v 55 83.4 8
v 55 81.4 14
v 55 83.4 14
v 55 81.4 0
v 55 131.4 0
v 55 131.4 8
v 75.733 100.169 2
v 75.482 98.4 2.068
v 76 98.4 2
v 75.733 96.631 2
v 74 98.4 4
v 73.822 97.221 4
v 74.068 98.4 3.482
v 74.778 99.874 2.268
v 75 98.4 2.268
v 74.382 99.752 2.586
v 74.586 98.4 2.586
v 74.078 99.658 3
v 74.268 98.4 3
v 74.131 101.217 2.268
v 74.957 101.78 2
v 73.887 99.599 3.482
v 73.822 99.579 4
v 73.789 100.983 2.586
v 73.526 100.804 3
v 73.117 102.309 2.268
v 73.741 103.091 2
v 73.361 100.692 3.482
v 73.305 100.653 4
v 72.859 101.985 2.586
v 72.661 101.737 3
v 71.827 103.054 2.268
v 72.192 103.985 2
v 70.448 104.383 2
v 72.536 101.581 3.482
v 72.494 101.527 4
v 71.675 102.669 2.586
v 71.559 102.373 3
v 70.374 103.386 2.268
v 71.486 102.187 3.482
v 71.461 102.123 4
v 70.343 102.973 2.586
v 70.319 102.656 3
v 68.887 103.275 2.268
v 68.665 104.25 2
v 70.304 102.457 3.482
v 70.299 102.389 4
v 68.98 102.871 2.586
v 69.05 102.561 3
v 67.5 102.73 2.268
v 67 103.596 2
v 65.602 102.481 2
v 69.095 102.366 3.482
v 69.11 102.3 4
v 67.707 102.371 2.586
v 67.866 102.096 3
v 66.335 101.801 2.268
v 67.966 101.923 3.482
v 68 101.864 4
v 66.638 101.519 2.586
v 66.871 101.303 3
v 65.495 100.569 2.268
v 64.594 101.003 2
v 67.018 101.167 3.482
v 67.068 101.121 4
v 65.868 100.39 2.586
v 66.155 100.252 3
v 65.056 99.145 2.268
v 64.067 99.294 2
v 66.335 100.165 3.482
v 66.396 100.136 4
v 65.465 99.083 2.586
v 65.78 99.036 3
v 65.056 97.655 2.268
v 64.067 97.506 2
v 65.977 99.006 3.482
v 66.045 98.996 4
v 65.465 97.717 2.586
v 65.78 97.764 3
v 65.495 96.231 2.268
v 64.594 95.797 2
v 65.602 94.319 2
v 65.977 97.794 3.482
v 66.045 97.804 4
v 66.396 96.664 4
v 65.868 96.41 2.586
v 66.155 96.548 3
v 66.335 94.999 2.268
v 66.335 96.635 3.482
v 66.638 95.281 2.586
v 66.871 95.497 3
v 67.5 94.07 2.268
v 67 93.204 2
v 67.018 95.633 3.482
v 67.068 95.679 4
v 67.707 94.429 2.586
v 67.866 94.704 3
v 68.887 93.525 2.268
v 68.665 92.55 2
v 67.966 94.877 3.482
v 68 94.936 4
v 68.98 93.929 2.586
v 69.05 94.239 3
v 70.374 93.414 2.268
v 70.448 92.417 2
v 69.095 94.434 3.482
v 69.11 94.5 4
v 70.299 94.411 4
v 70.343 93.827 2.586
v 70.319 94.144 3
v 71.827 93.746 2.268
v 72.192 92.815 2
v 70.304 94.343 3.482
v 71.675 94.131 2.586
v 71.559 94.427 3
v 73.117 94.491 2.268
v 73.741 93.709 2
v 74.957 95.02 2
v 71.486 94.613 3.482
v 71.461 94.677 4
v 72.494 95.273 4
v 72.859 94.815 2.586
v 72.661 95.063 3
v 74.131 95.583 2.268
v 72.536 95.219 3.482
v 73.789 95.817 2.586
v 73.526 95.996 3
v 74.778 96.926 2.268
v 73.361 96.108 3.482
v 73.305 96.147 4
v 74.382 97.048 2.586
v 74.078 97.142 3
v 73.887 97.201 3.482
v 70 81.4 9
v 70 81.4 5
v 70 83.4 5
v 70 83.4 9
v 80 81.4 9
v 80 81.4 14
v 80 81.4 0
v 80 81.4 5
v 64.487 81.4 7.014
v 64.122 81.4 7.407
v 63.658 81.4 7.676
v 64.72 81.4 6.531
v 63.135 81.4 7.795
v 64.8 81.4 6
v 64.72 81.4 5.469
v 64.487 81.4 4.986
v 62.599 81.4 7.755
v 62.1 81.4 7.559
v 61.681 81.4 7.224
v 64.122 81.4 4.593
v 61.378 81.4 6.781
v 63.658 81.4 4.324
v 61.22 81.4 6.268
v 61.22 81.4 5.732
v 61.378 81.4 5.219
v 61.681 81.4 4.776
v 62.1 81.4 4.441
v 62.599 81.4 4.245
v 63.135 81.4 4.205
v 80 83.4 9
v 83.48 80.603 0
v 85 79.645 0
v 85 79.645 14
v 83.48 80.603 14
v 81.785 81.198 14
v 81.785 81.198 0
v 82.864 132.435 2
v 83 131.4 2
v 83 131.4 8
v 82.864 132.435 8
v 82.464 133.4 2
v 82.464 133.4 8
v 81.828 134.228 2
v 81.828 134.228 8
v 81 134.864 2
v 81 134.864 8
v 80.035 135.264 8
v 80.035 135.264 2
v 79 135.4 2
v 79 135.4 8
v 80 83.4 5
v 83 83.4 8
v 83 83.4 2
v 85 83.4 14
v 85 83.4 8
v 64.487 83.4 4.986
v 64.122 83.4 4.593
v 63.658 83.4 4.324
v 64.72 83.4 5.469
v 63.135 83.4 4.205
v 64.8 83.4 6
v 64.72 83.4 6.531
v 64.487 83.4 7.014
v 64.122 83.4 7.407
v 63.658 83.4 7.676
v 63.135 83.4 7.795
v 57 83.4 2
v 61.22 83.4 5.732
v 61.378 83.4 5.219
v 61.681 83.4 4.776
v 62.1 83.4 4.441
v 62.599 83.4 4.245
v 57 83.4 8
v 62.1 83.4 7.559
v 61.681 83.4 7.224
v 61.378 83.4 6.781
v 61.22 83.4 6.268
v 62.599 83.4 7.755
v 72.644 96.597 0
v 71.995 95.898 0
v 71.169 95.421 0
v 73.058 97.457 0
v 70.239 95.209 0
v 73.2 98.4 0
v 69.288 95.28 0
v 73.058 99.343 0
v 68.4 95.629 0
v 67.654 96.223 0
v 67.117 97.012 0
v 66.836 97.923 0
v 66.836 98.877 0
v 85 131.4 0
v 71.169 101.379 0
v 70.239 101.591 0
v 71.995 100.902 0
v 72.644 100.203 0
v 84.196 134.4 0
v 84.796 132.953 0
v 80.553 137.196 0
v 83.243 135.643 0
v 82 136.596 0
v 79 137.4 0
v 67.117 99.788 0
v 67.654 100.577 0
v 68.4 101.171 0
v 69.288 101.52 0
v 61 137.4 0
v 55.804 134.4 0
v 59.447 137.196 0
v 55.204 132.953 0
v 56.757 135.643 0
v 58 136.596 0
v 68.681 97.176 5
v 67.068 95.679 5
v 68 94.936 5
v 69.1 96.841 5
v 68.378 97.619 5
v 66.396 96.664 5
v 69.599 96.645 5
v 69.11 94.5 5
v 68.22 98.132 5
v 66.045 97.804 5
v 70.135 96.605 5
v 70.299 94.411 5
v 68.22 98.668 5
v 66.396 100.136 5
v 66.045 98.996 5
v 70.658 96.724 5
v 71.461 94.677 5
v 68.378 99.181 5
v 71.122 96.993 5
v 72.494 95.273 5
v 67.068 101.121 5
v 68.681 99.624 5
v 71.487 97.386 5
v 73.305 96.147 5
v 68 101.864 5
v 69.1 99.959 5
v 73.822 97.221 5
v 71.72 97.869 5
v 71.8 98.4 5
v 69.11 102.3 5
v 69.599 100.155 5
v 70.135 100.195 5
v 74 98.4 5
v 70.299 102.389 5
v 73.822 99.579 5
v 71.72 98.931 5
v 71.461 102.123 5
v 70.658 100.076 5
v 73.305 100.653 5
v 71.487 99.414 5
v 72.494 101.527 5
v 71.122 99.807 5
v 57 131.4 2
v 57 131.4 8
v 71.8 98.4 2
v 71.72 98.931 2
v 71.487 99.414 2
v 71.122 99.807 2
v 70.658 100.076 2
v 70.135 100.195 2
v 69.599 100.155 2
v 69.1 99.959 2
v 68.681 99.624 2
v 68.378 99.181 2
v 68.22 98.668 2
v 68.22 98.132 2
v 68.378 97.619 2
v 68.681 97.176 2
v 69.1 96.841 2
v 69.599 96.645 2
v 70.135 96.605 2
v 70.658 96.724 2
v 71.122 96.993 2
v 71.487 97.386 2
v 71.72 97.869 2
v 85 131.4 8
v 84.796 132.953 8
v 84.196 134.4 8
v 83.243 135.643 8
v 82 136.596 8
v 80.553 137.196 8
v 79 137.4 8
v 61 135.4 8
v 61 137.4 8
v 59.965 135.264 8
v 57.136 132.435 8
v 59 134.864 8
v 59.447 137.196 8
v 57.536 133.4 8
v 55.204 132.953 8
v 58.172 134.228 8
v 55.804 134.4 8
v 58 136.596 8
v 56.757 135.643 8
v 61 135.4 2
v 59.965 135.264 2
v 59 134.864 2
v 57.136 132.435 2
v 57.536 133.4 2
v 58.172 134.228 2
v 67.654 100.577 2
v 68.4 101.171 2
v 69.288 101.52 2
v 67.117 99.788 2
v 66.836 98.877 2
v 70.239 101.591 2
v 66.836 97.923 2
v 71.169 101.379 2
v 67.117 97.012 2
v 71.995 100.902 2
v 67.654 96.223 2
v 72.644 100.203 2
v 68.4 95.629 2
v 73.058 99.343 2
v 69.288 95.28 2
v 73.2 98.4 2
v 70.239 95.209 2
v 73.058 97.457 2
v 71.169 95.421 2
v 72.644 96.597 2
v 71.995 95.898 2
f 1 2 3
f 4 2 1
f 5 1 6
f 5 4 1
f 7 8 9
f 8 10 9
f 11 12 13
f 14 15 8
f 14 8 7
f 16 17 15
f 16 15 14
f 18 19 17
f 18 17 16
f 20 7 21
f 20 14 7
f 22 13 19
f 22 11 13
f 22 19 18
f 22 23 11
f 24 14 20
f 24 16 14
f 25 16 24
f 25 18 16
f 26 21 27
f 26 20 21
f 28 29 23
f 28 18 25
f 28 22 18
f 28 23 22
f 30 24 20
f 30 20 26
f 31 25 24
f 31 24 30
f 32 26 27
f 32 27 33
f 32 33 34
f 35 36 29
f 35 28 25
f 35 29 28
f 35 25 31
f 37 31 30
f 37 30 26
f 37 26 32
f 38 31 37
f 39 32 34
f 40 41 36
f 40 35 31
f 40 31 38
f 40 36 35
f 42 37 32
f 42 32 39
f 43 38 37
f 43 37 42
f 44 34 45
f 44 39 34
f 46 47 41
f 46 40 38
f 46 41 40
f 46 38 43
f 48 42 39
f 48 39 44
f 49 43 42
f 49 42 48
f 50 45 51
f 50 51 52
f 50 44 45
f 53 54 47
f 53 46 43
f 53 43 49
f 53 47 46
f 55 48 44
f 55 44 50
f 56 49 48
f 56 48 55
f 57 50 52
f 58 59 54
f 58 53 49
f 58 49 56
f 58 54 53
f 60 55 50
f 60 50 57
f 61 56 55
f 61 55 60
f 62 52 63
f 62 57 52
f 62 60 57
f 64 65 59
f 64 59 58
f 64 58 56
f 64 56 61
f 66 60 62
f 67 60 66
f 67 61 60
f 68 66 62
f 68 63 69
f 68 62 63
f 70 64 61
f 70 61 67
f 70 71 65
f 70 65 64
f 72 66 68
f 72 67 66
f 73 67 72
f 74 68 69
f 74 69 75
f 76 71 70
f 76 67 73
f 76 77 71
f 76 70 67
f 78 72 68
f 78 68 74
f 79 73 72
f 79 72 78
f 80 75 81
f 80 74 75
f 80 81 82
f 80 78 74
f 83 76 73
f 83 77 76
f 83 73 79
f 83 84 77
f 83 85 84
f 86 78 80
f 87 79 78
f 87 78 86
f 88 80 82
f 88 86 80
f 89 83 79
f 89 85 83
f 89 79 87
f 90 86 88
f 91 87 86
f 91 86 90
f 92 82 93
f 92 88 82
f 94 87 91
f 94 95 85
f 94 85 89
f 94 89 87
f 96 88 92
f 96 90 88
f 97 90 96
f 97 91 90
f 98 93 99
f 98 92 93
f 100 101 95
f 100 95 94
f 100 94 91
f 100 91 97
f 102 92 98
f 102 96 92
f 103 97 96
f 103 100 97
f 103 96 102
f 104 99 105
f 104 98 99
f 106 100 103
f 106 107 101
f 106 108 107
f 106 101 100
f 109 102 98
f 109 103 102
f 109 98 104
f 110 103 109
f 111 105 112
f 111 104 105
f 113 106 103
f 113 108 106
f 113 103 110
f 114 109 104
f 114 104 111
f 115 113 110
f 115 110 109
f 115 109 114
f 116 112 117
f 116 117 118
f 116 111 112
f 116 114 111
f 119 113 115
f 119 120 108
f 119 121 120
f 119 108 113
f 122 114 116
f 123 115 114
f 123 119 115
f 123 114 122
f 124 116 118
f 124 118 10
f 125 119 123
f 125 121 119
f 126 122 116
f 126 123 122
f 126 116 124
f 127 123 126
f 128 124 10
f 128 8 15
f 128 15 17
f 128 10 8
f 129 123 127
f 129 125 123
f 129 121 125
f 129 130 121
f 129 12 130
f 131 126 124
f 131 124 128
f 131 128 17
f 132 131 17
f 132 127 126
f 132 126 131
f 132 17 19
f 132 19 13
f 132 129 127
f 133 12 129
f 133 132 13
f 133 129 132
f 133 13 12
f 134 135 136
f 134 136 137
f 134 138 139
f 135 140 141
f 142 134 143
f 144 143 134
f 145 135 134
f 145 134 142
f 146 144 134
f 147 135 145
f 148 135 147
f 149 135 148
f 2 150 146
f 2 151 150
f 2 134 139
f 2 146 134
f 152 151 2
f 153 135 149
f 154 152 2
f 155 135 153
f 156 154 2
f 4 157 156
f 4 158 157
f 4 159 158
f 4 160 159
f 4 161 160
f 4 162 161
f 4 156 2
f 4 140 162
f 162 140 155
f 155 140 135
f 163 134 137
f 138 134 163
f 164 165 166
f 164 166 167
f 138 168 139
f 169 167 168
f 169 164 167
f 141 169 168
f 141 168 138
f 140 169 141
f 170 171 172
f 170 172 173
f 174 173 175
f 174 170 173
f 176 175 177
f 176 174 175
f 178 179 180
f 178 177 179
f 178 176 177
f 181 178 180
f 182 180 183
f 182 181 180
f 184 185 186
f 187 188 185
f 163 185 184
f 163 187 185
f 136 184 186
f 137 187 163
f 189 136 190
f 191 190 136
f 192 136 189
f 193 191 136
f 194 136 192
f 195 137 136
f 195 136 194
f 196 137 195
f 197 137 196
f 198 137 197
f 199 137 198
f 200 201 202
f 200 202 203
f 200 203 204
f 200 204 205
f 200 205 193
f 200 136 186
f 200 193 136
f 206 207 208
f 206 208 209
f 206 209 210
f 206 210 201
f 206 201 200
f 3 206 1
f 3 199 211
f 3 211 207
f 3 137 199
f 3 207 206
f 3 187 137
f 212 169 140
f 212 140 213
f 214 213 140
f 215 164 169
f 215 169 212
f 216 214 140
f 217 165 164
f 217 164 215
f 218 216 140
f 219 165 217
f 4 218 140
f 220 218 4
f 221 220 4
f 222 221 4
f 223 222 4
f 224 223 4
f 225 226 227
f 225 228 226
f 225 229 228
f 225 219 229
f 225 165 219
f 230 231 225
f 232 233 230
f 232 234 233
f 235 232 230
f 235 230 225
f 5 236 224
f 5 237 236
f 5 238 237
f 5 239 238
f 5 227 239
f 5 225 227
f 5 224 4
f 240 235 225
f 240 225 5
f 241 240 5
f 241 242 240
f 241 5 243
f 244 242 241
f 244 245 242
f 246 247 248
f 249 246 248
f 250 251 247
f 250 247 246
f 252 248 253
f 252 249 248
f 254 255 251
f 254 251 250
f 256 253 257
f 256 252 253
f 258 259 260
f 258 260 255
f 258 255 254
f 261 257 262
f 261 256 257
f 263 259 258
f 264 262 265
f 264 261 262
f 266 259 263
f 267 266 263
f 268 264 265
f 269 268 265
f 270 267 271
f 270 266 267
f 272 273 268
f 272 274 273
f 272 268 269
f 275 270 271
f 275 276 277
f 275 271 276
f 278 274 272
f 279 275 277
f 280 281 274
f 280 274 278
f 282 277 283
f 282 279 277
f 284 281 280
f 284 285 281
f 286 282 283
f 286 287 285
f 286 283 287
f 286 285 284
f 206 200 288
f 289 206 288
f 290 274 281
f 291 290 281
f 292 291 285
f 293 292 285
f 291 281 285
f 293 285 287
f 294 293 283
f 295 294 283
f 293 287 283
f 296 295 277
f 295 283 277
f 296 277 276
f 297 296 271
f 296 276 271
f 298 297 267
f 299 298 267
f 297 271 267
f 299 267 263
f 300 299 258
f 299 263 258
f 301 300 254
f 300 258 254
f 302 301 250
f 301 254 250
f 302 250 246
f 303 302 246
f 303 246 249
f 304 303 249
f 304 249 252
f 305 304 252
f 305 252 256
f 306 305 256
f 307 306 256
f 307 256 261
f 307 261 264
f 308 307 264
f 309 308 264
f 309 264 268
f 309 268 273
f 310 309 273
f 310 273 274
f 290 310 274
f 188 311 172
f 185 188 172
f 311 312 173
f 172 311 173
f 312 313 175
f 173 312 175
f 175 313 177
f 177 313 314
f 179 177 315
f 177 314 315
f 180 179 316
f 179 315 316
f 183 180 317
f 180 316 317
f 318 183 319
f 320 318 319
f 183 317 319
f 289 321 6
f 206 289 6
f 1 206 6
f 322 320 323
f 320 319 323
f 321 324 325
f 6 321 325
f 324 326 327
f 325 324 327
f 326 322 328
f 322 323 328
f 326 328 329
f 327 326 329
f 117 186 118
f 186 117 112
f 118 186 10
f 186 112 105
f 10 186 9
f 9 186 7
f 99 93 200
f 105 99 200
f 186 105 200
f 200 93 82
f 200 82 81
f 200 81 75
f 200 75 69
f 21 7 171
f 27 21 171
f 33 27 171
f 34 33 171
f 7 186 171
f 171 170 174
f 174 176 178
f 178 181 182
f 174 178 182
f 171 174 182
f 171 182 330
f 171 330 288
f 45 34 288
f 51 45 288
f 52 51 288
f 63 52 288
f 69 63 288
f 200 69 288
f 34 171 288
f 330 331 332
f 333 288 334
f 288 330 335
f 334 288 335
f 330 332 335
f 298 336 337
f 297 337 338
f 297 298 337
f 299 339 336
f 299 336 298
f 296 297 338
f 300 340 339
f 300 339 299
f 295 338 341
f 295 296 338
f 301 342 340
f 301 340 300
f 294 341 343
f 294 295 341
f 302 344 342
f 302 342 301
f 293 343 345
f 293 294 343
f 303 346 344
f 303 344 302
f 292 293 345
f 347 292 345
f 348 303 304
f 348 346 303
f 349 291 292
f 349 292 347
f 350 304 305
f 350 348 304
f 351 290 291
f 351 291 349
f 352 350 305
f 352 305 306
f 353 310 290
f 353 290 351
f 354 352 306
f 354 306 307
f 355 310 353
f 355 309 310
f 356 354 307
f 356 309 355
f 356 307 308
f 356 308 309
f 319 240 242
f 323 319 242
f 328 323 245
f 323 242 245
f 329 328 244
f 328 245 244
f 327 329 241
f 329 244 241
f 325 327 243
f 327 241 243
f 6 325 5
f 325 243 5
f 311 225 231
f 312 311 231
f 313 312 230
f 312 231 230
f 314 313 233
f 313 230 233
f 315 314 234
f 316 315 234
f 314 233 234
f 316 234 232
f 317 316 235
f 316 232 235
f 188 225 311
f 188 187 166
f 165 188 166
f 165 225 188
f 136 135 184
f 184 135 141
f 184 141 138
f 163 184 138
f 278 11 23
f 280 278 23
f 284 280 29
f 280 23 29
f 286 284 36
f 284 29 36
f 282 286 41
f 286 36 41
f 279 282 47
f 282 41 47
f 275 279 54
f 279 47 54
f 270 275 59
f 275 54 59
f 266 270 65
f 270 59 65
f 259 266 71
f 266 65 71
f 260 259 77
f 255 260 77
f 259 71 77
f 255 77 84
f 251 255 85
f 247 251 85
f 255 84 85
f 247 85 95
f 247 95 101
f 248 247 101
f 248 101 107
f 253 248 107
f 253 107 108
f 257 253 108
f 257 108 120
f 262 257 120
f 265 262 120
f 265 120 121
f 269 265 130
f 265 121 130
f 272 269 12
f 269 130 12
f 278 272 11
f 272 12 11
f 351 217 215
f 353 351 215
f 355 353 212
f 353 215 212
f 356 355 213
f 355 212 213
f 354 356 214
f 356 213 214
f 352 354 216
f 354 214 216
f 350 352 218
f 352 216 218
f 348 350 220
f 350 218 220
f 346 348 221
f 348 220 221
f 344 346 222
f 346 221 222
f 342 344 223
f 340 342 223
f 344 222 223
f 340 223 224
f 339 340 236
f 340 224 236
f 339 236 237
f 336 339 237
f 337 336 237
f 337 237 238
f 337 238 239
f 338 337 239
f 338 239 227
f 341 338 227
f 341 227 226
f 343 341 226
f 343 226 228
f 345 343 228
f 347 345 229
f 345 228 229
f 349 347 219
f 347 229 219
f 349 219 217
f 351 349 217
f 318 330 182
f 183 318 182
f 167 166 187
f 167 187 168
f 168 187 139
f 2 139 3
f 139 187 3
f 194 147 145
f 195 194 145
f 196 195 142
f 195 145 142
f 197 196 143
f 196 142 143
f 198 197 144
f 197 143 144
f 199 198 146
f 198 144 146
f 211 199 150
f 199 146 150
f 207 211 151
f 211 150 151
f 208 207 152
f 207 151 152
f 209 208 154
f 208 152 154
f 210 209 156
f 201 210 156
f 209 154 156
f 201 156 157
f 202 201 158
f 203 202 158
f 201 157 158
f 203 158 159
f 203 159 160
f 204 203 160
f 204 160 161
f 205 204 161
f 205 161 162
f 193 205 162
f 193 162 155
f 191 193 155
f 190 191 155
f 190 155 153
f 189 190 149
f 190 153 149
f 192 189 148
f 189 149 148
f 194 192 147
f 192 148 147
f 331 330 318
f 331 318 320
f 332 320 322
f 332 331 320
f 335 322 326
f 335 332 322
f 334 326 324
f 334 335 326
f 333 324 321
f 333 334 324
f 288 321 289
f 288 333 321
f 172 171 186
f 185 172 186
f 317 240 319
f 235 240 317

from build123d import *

# Parameters (mm, degrees)
PAD014_DEPTH    = 14
POCKET017_DEPTH = 12
POCKET018_DEPTH = 6
SKETCH064_R     = 4
PAD015_DEPTH    = 3
SKETCH065_R     = 1.8
POCKET019_DEPTH = 5.001
SKETCH070_R     = 1.8
SKETCH070_W     = 10
SKETCH070_H     = 4
POCKET022_DEPTH = 2
SKETCH071_R     = 3.2
POCKET023_DEPTH = 2
FILLET003_R     = 2


with BuildPart() as part:
    # Sketch059 → Pad014 (new body)
    with BuildSketch(Plane.XY):
        with BuildLine():
            Line((61, 137.4), (79, 137.4))
            ThreePointArc((85, 131.4), (83.242641, 135.642641), (79, 137.4))
            Line((85, 131.4), (85, 79.644998))
            ThreePointArc((85, 79.644998), (82.64953, 80.948509), (80, 81.4))
            Line((80, 81.4), (55, 81.4))
            Line((55, 81.4), (55, 131.4))
            ThreePointArc((61, 137.4), (56.757359, 135.642641), (55, 131.4))
        make_face()
    extrude(amount=PAD014_DEPTH)

    # Sketch060 (on DatumPlane) → Pocket017 (cut)
    with BuildSketch(Plane.XY.offset(2)):
        with BuildLine():
            Line((61, 135.4), (79, 135.4))
            ThreePointArc((83, 131.4), (81.828427, 134.228427), (79, 135.4))
            Line((83, 131.4), (83, 83.4))
            Line((83, 83.4), (57, 83.4))
            Line((57, 83.4), (57, 131.4))
            ThreePointArc((61, 135.4), (58.171573, 134.228427), (57, 131.4))
        make_face()
    extrude(amount=POCKET017_DEPTH, mode=Mode.SUBTRACT)

    # Sketch063 (on Face5 of Pocket017) → Pocket018 (cut)
    with BuildSketch(Plane.XY.offset(14)):
        with BuildLine():
            Line((61, 137.4), (79, 137.4))
            ThreePointArc((85, 131.4), (83.242641, 135.642641), (79, 137.4))
            Line((85, 131.4), (85, 83.4))
            Line((85, 83.4), (55, 83.4))
            Line((55, 83.4), (55, 131.4))
            ThreePointArc((61, 137.4), (56.757359, 135.642641), (55, 131.4))
        make_face()
    extrude(amount=-POCKET018_DEPTH, mode=Mode.SUBTRACT)

    # Sketch064 (on Face20 of Pocket018) → Pad015 (join)
    with BuildSketch(Plane.XY.offset(2)):
        with Locations((70, 98.4)):
            Circle(SKETCH064_R)
    extrude(amount=PAD015_DEPTH)

    # Sketch065 (on Face22 of Pad015) → Pocket019 (cut, through all)
    with BuildSketch(Plane.XY.offset(5)):
        with Locations((70, 98.4)):
            Circle(SKETCH065_R)
    extrude(amount=-POCKET019_DEPTH, mode=Mode.SUBTRACT)

    # Sketch070 → Pocket022 (cut)
    with BuildSketch(Plane.XZ.offset(-81.4)):
        with Locations((63, 6)):
            Circle(SKETCH070_R)
        with Locations((75, 7)):
            Rectangle(SKETCH070_W, SKETCH070_H)
    extrude(amount=-POCKET022_DEPTH, mode=Mode.SUBTRACT)

    # Sketch071 (on Face2 of Pocket022) → Pocket023 (cut)
    with BuildSketch(Plane(origin=(0, 0, 0), x_dir=(1, 0, 0), z_dir=(0, 0, -1))):
        with Locations((70, -98.4)):
            Circle(SKETCH071_R)
    extrude(amount=-POCKET023_DEPTH, mode=Mode.SUBTRACT)

    # Fillet003
    fillet003_edges = [part.edges().sort_by_distance(p)[0] for p in [
        (66, 98.4, 2),
    ]]
    fillet(fillet003_edges, radius=FILLET003_R)


solid = part.part
